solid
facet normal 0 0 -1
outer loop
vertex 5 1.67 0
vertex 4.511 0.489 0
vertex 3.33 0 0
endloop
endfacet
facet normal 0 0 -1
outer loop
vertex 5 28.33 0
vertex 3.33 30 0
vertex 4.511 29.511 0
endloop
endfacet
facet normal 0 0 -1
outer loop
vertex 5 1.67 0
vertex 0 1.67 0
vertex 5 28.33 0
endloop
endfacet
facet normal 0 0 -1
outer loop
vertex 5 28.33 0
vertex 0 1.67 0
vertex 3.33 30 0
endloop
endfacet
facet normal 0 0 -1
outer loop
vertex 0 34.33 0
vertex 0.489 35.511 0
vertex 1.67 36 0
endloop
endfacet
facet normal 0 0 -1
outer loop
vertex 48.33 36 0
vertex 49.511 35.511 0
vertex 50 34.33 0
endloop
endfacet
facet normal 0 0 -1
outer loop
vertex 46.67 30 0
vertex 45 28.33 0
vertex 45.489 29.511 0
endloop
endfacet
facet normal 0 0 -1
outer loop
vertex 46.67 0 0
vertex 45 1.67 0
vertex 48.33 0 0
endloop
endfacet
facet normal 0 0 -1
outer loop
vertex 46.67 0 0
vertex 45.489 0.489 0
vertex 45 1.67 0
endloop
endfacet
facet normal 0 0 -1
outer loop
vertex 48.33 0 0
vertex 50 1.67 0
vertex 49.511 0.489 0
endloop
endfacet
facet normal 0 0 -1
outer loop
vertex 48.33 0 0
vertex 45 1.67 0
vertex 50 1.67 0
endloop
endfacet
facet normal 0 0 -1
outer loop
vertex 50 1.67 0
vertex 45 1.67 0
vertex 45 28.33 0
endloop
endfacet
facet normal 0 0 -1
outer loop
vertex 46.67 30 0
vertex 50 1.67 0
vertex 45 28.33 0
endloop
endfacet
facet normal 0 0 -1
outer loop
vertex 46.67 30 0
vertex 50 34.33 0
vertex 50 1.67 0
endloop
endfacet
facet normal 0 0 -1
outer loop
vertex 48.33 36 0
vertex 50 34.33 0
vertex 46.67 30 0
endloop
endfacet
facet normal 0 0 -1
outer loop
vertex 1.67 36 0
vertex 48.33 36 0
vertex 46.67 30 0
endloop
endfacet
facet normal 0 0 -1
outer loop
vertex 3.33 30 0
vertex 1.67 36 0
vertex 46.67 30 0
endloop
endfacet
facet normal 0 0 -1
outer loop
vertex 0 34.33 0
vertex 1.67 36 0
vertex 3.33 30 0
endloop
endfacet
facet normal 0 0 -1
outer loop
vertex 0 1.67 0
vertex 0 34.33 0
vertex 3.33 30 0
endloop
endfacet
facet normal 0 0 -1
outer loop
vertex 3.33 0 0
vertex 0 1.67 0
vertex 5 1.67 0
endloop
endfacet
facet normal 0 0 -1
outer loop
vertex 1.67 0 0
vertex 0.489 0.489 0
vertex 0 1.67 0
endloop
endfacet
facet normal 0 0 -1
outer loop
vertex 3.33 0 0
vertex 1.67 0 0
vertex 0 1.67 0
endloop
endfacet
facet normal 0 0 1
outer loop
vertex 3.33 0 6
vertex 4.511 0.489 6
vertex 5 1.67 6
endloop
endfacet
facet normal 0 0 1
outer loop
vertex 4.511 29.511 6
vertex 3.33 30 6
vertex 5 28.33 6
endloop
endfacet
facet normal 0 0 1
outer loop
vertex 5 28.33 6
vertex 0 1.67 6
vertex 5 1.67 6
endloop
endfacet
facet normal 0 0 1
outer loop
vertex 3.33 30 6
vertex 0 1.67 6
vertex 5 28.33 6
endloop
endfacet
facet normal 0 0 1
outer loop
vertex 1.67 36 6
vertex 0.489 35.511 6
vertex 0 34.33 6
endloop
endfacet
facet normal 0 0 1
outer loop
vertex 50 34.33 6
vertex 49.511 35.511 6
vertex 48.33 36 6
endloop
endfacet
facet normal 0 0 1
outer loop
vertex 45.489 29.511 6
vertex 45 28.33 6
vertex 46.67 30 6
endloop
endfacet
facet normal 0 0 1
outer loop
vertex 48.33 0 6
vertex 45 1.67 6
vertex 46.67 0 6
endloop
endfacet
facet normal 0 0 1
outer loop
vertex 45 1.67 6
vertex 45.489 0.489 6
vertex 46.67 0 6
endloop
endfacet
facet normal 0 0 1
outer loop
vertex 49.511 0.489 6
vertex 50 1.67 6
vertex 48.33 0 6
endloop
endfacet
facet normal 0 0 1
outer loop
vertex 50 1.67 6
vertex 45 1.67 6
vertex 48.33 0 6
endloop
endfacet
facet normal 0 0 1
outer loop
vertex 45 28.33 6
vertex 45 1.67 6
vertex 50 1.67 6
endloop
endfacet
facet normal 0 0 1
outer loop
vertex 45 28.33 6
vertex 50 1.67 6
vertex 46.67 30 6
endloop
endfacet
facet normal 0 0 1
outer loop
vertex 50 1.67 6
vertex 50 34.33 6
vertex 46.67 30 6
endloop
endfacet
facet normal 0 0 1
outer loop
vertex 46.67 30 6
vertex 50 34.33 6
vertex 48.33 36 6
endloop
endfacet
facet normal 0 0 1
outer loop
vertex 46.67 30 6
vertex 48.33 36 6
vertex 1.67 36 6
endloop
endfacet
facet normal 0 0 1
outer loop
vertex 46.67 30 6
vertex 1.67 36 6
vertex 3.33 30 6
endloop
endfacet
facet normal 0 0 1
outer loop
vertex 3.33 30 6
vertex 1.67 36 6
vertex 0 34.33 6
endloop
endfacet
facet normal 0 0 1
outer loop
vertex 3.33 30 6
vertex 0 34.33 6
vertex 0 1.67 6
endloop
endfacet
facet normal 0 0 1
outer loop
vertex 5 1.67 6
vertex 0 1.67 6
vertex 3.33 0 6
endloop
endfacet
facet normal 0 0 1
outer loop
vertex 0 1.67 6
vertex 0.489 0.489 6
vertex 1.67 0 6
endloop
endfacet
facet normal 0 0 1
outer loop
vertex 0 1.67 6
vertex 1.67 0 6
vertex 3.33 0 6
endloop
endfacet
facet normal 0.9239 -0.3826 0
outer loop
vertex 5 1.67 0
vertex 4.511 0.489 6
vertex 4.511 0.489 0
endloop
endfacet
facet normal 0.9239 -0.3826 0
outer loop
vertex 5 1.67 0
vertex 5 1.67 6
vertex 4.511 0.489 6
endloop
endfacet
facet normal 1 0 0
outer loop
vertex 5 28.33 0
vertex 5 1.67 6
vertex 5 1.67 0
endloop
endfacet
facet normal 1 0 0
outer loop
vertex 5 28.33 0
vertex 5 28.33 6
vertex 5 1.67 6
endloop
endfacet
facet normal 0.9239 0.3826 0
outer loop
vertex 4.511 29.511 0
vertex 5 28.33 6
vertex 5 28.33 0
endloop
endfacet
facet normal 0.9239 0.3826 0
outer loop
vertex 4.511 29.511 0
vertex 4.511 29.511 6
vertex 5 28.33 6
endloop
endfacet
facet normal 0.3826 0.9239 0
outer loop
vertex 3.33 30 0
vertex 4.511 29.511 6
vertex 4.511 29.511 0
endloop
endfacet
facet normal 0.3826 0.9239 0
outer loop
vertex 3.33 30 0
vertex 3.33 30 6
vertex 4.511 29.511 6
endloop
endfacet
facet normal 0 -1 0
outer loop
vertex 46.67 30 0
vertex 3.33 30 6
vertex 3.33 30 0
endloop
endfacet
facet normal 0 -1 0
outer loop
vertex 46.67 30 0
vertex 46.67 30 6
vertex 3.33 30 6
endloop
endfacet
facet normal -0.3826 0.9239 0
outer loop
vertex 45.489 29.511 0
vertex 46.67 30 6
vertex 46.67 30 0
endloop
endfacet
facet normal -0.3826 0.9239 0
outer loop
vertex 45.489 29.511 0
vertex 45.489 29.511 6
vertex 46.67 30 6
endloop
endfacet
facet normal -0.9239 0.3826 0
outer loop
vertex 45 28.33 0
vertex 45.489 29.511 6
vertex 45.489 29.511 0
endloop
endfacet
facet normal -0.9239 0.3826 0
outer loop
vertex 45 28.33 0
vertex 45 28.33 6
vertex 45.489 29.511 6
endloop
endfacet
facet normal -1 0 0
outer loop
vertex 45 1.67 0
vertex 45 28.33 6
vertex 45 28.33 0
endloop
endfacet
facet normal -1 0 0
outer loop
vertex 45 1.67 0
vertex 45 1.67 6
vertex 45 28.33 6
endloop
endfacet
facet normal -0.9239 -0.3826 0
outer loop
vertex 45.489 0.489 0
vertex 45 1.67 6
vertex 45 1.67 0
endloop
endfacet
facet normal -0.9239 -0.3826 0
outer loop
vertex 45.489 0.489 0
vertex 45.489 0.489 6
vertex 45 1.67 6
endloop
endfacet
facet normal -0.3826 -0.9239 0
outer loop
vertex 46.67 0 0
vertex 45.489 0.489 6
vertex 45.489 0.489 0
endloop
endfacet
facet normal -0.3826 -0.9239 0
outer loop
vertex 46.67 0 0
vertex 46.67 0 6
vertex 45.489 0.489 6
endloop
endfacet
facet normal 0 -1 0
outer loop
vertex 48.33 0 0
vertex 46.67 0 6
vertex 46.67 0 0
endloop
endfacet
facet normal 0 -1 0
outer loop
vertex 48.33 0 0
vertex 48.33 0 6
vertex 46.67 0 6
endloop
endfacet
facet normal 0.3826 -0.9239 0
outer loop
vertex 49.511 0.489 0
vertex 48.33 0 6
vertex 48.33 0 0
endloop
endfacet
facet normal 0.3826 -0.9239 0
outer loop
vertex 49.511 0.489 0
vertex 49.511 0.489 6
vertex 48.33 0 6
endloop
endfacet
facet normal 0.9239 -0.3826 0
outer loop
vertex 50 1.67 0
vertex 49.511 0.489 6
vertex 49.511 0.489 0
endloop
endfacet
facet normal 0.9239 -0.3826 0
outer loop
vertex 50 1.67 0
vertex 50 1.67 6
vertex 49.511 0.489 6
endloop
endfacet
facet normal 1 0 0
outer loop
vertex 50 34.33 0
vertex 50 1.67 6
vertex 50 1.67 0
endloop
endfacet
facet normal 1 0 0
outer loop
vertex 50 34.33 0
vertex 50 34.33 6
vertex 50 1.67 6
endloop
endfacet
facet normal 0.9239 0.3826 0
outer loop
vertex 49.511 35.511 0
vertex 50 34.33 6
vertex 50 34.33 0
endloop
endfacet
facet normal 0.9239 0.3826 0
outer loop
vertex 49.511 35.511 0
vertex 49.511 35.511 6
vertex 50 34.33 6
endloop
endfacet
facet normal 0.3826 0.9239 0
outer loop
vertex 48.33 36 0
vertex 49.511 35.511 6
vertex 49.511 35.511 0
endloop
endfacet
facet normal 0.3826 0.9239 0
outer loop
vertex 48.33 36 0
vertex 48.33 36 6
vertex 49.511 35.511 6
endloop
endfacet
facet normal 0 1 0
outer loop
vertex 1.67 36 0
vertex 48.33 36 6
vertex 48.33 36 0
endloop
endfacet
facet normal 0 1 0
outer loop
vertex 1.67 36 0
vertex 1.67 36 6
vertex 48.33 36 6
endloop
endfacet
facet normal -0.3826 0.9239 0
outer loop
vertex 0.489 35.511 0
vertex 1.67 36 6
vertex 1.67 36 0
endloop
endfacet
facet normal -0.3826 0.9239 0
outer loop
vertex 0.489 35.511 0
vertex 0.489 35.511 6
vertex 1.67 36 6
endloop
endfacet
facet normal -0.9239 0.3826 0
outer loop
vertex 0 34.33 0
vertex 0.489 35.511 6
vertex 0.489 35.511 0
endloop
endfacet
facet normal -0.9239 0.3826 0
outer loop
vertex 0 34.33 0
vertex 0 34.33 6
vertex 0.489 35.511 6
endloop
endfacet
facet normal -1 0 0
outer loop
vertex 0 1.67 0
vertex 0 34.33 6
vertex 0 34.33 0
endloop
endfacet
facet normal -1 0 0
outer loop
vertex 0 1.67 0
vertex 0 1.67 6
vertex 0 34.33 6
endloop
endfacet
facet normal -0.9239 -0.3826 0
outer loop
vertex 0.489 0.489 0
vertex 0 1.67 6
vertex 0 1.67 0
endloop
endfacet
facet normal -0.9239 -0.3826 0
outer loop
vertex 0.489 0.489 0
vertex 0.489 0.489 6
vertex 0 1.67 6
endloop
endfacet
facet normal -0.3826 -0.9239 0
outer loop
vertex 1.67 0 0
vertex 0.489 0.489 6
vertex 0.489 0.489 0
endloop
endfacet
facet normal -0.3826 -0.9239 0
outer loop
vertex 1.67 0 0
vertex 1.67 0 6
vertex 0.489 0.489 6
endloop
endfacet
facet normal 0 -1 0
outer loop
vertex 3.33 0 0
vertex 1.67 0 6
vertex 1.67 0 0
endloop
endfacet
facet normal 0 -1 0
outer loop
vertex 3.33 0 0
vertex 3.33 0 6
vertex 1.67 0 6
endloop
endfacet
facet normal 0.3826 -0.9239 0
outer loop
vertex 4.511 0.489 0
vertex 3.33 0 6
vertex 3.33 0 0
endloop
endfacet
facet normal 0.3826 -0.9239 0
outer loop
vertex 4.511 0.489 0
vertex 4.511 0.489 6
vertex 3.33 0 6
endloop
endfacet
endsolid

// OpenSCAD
$fn = 32;

// ----------------------------------------------------------------------
// Clip blank: staple clip, 6 mm thick
// ----------------------------------------------------------------------

// --- parameters (mm) ---
profile_height = 6;       // extrusion height
profile_points = 24;      // points of the closed outline

profile = [[0, 1.67], [0.489, 0.489], [1.67, 0], [3.33, 0], [4.511, 0.489], [5, 1.67], [5, 28.33], [4.511, 29.511], [3.33, 30], [46.67, 30], [45.489, 29.511], [45, 28.33], [45, 1.67], [45.489, 0.489], [46.67, 0], [48.33, 0], [49.511, 0.489], [50, 1.67], [50, 34.33], [49.511, 35.511], [48.33, 36], [1.67, 36], [0.489, 35.511], [0, 34.33]];  // single closed polygon, 24 points, counter clockwise

// --- the one profile operation ---
linear_extrude(height = profile_height) polygon(points = profile);
